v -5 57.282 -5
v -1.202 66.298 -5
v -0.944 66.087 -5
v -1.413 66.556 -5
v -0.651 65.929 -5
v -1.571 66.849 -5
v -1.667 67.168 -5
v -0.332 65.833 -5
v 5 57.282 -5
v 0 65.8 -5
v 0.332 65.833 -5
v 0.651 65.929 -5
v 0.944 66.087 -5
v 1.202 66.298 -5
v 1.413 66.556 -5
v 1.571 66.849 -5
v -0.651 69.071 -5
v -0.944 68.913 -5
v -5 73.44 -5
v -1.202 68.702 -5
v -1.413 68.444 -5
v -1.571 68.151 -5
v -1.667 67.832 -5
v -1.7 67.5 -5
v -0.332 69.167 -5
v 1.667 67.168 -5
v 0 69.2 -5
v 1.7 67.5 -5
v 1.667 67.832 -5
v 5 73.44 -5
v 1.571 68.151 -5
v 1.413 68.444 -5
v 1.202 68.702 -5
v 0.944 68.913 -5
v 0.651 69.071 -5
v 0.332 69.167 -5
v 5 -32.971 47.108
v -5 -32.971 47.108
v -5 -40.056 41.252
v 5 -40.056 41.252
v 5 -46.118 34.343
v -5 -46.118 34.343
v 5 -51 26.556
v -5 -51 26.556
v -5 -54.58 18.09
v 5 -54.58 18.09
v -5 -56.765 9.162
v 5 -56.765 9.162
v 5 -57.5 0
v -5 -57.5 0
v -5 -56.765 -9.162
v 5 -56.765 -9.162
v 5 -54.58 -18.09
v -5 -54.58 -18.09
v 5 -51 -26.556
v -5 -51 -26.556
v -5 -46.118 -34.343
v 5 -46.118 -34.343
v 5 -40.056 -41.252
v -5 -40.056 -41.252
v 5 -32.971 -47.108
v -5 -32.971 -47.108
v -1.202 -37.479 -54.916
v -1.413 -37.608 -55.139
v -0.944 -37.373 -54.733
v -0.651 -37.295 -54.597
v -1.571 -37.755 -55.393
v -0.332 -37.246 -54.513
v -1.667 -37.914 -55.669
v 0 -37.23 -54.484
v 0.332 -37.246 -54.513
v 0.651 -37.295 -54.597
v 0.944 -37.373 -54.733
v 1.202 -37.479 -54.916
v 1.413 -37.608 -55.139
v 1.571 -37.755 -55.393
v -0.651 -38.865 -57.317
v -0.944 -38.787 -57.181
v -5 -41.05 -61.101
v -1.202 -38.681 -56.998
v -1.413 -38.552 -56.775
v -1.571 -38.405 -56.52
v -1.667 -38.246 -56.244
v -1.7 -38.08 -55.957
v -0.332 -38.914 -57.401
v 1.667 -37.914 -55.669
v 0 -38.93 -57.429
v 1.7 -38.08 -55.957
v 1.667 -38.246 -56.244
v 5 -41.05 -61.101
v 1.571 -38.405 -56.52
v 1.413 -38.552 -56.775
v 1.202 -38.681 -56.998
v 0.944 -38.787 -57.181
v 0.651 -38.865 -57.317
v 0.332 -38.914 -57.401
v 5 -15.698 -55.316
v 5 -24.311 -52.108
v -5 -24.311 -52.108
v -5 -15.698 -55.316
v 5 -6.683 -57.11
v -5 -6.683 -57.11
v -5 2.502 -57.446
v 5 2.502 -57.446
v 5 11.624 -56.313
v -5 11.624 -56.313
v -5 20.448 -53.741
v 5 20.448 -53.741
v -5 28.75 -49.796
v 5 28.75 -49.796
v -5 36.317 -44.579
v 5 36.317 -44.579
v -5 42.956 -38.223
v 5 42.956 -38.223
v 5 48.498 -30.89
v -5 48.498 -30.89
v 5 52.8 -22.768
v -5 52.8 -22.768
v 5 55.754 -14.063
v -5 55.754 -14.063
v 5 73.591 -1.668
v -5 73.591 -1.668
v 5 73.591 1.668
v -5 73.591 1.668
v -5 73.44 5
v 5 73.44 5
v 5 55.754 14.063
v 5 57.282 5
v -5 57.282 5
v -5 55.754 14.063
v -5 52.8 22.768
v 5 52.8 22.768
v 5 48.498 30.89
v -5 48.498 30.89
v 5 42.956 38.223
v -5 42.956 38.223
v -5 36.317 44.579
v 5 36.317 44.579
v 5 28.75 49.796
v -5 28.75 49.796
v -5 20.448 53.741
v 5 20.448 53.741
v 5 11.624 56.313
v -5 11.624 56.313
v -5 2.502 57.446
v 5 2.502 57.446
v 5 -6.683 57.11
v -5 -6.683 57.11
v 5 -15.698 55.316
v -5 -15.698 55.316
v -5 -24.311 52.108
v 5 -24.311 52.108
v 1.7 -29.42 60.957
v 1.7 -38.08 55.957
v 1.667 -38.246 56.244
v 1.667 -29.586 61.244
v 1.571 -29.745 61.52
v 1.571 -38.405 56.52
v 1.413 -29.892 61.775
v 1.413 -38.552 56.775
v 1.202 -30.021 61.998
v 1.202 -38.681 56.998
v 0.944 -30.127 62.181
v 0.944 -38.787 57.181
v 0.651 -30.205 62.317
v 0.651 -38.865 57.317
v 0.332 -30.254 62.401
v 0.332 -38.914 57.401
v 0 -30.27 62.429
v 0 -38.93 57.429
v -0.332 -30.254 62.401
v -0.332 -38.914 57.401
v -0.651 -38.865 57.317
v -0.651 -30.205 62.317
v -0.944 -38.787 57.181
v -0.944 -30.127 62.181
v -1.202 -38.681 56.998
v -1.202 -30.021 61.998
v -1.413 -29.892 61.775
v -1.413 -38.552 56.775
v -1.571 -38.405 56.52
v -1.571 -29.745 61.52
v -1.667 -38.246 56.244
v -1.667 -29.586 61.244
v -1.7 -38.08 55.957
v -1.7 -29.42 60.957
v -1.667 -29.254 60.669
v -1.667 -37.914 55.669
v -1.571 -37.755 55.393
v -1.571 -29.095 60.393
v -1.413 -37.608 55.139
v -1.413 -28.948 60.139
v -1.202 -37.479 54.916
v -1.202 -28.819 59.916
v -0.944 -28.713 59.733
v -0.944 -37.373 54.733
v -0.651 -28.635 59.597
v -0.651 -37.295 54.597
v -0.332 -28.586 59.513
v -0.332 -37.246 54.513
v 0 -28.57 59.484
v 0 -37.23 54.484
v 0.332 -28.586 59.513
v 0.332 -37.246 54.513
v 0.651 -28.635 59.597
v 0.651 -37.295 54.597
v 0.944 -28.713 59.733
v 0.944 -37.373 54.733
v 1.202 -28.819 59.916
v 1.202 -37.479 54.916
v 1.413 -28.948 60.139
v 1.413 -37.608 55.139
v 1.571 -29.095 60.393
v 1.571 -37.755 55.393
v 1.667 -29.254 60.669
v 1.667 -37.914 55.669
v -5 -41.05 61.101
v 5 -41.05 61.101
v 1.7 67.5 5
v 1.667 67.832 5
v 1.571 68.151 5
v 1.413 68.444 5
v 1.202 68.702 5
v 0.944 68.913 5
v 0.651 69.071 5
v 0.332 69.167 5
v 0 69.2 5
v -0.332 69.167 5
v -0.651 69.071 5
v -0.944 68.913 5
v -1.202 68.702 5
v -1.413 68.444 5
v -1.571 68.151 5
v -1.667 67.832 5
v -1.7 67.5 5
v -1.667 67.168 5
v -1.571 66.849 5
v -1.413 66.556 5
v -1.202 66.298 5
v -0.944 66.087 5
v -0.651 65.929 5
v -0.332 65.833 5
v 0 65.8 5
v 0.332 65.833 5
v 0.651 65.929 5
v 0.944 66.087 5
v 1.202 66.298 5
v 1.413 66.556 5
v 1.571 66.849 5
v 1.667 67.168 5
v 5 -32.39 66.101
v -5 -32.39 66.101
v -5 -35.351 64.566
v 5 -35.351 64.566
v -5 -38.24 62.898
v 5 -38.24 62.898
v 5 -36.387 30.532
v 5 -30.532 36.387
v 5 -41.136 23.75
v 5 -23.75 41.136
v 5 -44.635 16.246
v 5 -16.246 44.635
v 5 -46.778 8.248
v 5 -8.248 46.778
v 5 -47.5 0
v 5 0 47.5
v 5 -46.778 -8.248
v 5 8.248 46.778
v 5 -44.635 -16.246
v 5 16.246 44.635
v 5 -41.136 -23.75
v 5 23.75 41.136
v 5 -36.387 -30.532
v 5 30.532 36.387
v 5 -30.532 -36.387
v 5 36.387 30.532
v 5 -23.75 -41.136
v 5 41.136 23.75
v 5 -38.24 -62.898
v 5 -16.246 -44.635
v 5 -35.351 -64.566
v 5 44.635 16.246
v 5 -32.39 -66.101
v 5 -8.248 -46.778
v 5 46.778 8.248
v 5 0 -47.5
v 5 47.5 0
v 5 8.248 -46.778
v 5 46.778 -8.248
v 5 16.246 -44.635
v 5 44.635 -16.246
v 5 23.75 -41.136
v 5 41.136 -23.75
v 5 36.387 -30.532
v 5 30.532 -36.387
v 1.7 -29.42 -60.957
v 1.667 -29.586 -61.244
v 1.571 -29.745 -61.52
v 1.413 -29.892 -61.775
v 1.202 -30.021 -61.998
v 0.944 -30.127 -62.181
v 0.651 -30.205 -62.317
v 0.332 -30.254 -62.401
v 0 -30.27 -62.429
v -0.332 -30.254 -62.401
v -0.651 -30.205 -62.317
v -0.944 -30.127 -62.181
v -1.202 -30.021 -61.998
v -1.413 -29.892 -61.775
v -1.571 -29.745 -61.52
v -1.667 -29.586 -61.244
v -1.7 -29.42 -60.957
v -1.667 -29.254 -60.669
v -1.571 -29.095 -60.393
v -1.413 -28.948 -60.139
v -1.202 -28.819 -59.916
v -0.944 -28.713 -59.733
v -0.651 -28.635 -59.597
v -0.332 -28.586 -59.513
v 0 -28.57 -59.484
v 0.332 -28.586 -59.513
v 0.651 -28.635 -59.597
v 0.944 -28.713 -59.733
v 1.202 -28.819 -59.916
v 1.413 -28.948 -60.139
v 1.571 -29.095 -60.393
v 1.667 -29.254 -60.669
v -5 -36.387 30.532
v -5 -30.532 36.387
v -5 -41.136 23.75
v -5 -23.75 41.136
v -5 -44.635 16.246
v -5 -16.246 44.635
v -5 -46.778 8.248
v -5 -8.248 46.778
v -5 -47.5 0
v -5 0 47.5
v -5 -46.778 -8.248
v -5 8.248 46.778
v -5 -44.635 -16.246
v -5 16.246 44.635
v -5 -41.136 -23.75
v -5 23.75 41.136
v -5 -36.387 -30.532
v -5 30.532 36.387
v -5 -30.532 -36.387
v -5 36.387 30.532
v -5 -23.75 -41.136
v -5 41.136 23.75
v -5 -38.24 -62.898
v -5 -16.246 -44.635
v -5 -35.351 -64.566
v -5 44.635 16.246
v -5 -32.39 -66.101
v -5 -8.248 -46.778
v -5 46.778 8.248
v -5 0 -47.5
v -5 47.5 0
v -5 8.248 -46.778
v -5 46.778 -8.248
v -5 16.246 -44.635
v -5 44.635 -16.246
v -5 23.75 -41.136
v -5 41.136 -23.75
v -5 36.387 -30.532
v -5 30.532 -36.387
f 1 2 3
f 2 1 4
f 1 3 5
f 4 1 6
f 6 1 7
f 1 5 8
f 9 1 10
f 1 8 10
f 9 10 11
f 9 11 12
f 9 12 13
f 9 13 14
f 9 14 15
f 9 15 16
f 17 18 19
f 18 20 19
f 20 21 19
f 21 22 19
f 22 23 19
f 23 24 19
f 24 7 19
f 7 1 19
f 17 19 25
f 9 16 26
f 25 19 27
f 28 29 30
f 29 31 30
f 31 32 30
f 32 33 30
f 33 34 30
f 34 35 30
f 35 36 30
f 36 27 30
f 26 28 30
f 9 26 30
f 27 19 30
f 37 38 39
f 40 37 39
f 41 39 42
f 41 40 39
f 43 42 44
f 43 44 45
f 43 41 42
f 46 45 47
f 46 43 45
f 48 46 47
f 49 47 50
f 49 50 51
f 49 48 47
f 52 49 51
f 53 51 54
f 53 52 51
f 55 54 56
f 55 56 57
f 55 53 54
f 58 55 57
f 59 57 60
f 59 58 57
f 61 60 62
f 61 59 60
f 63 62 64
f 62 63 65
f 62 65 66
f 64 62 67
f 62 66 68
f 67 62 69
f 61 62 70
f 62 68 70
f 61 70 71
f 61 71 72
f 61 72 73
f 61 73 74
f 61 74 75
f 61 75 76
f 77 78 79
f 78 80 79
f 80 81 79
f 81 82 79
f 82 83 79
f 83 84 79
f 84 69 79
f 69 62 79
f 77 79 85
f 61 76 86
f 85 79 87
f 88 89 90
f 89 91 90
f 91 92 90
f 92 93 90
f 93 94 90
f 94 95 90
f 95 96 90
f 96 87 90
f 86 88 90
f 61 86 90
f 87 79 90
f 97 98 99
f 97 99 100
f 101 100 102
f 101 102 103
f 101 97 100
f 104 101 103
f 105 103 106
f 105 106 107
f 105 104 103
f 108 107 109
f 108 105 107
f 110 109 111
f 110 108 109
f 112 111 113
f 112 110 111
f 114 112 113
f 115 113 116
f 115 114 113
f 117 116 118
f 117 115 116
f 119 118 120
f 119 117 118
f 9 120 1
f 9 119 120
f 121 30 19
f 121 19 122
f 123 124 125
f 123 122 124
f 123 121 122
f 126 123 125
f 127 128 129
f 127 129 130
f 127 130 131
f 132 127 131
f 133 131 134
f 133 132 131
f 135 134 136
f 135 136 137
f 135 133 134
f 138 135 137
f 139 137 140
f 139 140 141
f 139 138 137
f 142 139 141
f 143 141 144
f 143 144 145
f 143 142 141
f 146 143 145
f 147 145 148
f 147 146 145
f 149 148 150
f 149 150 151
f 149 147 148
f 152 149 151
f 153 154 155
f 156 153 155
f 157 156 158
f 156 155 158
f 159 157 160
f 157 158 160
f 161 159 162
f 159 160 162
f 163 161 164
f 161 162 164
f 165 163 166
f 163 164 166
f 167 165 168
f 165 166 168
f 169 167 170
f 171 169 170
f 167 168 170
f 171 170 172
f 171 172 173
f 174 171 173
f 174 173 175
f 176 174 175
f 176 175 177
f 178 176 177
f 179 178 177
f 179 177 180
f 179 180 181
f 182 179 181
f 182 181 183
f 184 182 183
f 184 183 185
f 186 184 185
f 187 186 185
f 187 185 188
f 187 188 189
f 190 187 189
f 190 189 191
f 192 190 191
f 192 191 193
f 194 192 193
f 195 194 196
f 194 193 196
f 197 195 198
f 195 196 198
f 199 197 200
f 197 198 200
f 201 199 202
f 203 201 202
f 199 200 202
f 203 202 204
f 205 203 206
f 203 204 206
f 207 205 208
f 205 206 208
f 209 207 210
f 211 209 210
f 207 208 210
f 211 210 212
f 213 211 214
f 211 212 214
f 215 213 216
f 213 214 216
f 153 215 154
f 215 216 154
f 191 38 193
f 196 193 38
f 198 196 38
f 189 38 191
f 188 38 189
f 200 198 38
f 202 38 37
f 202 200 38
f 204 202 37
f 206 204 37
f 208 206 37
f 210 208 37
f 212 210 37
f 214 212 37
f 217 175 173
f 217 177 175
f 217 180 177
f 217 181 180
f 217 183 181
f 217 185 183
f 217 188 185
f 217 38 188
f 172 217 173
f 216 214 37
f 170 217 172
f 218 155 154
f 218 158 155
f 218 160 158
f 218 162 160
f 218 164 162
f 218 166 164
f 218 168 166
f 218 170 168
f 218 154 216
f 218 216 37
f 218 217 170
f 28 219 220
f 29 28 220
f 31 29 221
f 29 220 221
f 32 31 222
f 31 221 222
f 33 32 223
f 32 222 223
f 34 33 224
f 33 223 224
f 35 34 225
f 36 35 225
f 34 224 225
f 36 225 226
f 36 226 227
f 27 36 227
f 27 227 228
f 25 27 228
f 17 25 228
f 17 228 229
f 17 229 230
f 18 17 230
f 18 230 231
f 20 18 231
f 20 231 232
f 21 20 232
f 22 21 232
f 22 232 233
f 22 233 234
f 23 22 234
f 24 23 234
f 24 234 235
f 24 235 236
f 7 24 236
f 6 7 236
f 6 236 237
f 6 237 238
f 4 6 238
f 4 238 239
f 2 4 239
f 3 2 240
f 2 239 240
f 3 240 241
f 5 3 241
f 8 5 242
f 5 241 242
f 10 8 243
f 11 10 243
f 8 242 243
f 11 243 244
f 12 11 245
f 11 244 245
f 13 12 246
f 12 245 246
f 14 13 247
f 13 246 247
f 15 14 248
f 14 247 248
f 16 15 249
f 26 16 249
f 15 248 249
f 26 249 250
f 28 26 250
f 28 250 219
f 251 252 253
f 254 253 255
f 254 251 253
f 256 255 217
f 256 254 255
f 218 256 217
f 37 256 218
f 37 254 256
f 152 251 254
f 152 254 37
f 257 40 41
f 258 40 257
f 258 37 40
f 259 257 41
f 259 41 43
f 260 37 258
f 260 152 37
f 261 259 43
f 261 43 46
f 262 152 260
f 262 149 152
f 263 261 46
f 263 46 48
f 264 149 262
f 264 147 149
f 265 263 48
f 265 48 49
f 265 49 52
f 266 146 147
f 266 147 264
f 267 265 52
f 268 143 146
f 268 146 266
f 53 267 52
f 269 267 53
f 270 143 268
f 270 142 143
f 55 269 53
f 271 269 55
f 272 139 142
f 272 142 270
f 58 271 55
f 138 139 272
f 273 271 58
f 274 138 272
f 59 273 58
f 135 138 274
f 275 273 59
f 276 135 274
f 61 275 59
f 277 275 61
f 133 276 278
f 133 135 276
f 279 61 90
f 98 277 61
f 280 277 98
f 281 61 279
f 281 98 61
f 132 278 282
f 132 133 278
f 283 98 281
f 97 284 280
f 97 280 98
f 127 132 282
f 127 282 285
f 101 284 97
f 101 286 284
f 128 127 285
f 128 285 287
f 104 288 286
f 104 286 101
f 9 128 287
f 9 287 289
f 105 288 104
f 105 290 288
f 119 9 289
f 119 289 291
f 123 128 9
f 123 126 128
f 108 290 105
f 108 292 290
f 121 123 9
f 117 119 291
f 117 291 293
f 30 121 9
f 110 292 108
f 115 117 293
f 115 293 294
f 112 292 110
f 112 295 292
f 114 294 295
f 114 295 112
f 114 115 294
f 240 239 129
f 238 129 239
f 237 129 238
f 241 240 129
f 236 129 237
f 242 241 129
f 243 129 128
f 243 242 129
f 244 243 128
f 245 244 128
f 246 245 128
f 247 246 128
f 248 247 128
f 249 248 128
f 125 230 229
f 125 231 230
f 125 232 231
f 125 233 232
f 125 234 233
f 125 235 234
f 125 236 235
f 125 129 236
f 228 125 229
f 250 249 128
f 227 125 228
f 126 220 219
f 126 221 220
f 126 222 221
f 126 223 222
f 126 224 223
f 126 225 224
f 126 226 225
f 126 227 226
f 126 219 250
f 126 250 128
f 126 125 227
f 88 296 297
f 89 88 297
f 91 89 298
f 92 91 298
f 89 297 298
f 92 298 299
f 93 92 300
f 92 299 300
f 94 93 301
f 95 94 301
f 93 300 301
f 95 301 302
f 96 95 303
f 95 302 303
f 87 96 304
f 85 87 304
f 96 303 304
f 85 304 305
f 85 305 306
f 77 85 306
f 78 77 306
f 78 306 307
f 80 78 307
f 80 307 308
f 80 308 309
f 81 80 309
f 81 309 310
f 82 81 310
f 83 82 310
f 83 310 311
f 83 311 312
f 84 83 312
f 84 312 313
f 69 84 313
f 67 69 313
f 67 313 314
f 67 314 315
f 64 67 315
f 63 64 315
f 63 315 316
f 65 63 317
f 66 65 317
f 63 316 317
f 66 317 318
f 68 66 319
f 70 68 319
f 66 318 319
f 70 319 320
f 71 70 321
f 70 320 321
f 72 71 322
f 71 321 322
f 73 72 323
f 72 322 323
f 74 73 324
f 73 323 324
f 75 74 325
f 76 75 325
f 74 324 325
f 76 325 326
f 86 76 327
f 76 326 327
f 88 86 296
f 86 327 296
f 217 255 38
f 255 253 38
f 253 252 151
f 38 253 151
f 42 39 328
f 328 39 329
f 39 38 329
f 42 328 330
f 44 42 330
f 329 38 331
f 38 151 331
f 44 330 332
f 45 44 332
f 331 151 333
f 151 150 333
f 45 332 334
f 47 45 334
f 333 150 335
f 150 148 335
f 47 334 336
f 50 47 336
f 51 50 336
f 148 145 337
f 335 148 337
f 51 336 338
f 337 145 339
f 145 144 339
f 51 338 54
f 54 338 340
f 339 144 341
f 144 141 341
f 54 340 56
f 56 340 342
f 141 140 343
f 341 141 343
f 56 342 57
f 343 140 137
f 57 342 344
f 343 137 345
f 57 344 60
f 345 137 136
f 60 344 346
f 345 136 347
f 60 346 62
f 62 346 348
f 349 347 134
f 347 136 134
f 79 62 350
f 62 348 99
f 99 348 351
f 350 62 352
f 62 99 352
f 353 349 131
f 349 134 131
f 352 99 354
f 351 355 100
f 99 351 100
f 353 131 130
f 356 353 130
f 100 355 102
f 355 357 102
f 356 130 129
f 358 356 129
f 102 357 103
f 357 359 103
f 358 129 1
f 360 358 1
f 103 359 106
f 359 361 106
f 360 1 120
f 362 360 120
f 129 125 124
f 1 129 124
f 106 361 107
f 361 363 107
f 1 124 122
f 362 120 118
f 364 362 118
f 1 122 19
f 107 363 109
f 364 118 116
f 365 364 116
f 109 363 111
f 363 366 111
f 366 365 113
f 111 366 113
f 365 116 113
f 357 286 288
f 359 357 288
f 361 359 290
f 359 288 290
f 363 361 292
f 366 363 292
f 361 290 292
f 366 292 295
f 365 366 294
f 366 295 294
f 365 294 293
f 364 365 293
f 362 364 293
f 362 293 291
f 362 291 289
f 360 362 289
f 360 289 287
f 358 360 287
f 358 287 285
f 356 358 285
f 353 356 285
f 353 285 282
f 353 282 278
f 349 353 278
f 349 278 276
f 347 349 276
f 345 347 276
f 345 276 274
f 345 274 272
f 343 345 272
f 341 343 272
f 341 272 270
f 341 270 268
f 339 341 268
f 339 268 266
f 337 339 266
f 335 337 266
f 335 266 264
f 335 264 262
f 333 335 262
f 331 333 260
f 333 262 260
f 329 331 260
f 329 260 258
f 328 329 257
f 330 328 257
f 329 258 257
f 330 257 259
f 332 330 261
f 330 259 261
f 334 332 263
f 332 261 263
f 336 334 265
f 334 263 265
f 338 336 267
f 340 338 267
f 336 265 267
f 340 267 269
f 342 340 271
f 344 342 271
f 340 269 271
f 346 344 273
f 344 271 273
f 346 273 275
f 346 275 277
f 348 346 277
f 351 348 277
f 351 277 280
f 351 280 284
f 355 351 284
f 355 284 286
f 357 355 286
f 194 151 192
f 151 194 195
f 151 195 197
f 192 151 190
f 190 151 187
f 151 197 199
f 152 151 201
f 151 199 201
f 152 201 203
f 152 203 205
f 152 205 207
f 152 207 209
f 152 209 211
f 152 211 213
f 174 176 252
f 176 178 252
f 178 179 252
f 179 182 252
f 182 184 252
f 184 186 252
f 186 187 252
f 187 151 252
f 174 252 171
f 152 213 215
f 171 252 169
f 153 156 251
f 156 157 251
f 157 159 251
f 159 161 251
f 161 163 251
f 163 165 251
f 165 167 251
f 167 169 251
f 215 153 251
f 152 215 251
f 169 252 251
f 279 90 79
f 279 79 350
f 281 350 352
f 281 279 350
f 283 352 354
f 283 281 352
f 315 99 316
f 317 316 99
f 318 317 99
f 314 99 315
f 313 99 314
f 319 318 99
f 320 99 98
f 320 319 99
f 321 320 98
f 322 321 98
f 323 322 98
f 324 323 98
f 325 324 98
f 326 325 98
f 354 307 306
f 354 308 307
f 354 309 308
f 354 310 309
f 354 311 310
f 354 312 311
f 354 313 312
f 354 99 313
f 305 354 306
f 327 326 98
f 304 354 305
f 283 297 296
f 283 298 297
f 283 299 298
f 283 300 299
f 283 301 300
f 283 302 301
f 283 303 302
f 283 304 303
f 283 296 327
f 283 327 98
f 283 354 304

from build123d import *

# Parameters (mm, degrees)
ESQUISSE2_W                  = 10
ESQUISSE2_H                  = 73.61
BOSS_EXTRU_1_DEPTH           = 5
ENL_V_MAT_EXTRU_1_DEPTH      = 75.454228221
D_GAGEMENT_M31_D             = 3.4
R_P_TITION_CIRCULAIRE1_COUNT = 3
ESQUISSE8_R                  = 57.5
BOSS_EXTRU_2_DEPTH           = 10
ESQUISSE9_R                  = 47.5
ENL_V_MAT_EXTRU_3_DEPTH      = 100.437219687


with BuildPart() as part:
    # Esquisse2 → Boss.-Extru.1 (new, symmetric)
    with BuildSketch(Plane.XY):
        with Locations((0, 36.805)):
            Rectangle(ESQUISSE2_W, ESQUISSE2_H)
    boss_extru_1 = extrude(amount=BOSS_EXTRU_1_DEPTH, both=True)

    # Esquisse3 → Enlèv. mat.-Extru.1 (cut, through all)
    with BuildSketch(Plane(origin=(5, 0, 0), x_dir=(0, 0, -1), z_dir=(1, 0, 0))):
        with BuildLine():
            Line((-25.399222728, 69.089156782), (-25.399222728, 83.587655611))
            Line((-25.399222728, 83.587655611), (25.399222728, 83.587655611))
            Line((25.399222728, 83.587655611), (25.399222728, 69.089156782))
            ThreePointArc((25.399222728, 69.089156782), (0, 73.61), (-25.399222728, 69.089156782))
        make_face()
    enl_v_mat_extru_1 = extrude(amount=-ENL_V_MAT_EXTRU_1_DEPTH, mode=Mode.SUBTRACT)

    # Dégagement M31 (through all)
    with Locations(Plane(origin=(0, 0, -5), x_dir=(-1, 0, 0), z_dir=(0, 0, -1))):
        with Locations((0, 67.5)):
            d_gagement_m31 = Hole(D_GAGEMENT_M31_D / 2)

    # Répétition circulaire1: Boss.-Extru.1, Enlèv. mat.-Extru.1, Dégagement M31 ×3 about axis
    r_p_tition_circulaire1_axis = Axis((0, 0, 0), (1, 0, 0))
    add([boss_extru_1.rotate(r_p_tition_circulaire1_axis, i * 360 / R_P_TITION_CIRCULAIRE1_COUNT) for i in range(1, R_P_TITION_CIRCULAIRE1_COUNT)])
    add([enl_v_mat_extru_1.rotate(r_p_tition_circulaire1_axis, i * 360 / R_P_TITION_CIRCULAIRE1_COUNT) for i in range(1, R_P_TITION_CIRCULAIRE1_COUNT)], mode=Mode.SUBTRACT)
    add([d_gagement_m31.rotate(r_p_tition_circulaire1_axis, i * 360 / R_P_TITION_CIRCULAIRE1_COUNT) for i in range(1, R_P_TITION_CIRCULAIRE1_COUNT)], mode=Mode.SUBTRACT)

    # Esquisse8 → Boss.-Extru.2 (add)
    with BuildSketch(Plane(origin=(5, 0, 0), x_dir=(0, 0, -1), z_dir=(1, 0, 0))):
        Circle(ESQUISSE8_R)
    extrude(amount=-BOSS_EXTRU_2_DEPTH)

    # Esquisse9 → Enlèv. mat.-Extru.3 (cut, through all)
    with BuildSketch(Plane(origin=(5, 0, 0), x_dir=(0, 0, -1), z_dir=(1, 0, 0))):
        Circle(ESQUISSE9_R)
    extrude(amount=-ENL_V_MAT_EXTRU_3_DEPTH, mode=Mode.SUBTRACT)


solid = part.part
